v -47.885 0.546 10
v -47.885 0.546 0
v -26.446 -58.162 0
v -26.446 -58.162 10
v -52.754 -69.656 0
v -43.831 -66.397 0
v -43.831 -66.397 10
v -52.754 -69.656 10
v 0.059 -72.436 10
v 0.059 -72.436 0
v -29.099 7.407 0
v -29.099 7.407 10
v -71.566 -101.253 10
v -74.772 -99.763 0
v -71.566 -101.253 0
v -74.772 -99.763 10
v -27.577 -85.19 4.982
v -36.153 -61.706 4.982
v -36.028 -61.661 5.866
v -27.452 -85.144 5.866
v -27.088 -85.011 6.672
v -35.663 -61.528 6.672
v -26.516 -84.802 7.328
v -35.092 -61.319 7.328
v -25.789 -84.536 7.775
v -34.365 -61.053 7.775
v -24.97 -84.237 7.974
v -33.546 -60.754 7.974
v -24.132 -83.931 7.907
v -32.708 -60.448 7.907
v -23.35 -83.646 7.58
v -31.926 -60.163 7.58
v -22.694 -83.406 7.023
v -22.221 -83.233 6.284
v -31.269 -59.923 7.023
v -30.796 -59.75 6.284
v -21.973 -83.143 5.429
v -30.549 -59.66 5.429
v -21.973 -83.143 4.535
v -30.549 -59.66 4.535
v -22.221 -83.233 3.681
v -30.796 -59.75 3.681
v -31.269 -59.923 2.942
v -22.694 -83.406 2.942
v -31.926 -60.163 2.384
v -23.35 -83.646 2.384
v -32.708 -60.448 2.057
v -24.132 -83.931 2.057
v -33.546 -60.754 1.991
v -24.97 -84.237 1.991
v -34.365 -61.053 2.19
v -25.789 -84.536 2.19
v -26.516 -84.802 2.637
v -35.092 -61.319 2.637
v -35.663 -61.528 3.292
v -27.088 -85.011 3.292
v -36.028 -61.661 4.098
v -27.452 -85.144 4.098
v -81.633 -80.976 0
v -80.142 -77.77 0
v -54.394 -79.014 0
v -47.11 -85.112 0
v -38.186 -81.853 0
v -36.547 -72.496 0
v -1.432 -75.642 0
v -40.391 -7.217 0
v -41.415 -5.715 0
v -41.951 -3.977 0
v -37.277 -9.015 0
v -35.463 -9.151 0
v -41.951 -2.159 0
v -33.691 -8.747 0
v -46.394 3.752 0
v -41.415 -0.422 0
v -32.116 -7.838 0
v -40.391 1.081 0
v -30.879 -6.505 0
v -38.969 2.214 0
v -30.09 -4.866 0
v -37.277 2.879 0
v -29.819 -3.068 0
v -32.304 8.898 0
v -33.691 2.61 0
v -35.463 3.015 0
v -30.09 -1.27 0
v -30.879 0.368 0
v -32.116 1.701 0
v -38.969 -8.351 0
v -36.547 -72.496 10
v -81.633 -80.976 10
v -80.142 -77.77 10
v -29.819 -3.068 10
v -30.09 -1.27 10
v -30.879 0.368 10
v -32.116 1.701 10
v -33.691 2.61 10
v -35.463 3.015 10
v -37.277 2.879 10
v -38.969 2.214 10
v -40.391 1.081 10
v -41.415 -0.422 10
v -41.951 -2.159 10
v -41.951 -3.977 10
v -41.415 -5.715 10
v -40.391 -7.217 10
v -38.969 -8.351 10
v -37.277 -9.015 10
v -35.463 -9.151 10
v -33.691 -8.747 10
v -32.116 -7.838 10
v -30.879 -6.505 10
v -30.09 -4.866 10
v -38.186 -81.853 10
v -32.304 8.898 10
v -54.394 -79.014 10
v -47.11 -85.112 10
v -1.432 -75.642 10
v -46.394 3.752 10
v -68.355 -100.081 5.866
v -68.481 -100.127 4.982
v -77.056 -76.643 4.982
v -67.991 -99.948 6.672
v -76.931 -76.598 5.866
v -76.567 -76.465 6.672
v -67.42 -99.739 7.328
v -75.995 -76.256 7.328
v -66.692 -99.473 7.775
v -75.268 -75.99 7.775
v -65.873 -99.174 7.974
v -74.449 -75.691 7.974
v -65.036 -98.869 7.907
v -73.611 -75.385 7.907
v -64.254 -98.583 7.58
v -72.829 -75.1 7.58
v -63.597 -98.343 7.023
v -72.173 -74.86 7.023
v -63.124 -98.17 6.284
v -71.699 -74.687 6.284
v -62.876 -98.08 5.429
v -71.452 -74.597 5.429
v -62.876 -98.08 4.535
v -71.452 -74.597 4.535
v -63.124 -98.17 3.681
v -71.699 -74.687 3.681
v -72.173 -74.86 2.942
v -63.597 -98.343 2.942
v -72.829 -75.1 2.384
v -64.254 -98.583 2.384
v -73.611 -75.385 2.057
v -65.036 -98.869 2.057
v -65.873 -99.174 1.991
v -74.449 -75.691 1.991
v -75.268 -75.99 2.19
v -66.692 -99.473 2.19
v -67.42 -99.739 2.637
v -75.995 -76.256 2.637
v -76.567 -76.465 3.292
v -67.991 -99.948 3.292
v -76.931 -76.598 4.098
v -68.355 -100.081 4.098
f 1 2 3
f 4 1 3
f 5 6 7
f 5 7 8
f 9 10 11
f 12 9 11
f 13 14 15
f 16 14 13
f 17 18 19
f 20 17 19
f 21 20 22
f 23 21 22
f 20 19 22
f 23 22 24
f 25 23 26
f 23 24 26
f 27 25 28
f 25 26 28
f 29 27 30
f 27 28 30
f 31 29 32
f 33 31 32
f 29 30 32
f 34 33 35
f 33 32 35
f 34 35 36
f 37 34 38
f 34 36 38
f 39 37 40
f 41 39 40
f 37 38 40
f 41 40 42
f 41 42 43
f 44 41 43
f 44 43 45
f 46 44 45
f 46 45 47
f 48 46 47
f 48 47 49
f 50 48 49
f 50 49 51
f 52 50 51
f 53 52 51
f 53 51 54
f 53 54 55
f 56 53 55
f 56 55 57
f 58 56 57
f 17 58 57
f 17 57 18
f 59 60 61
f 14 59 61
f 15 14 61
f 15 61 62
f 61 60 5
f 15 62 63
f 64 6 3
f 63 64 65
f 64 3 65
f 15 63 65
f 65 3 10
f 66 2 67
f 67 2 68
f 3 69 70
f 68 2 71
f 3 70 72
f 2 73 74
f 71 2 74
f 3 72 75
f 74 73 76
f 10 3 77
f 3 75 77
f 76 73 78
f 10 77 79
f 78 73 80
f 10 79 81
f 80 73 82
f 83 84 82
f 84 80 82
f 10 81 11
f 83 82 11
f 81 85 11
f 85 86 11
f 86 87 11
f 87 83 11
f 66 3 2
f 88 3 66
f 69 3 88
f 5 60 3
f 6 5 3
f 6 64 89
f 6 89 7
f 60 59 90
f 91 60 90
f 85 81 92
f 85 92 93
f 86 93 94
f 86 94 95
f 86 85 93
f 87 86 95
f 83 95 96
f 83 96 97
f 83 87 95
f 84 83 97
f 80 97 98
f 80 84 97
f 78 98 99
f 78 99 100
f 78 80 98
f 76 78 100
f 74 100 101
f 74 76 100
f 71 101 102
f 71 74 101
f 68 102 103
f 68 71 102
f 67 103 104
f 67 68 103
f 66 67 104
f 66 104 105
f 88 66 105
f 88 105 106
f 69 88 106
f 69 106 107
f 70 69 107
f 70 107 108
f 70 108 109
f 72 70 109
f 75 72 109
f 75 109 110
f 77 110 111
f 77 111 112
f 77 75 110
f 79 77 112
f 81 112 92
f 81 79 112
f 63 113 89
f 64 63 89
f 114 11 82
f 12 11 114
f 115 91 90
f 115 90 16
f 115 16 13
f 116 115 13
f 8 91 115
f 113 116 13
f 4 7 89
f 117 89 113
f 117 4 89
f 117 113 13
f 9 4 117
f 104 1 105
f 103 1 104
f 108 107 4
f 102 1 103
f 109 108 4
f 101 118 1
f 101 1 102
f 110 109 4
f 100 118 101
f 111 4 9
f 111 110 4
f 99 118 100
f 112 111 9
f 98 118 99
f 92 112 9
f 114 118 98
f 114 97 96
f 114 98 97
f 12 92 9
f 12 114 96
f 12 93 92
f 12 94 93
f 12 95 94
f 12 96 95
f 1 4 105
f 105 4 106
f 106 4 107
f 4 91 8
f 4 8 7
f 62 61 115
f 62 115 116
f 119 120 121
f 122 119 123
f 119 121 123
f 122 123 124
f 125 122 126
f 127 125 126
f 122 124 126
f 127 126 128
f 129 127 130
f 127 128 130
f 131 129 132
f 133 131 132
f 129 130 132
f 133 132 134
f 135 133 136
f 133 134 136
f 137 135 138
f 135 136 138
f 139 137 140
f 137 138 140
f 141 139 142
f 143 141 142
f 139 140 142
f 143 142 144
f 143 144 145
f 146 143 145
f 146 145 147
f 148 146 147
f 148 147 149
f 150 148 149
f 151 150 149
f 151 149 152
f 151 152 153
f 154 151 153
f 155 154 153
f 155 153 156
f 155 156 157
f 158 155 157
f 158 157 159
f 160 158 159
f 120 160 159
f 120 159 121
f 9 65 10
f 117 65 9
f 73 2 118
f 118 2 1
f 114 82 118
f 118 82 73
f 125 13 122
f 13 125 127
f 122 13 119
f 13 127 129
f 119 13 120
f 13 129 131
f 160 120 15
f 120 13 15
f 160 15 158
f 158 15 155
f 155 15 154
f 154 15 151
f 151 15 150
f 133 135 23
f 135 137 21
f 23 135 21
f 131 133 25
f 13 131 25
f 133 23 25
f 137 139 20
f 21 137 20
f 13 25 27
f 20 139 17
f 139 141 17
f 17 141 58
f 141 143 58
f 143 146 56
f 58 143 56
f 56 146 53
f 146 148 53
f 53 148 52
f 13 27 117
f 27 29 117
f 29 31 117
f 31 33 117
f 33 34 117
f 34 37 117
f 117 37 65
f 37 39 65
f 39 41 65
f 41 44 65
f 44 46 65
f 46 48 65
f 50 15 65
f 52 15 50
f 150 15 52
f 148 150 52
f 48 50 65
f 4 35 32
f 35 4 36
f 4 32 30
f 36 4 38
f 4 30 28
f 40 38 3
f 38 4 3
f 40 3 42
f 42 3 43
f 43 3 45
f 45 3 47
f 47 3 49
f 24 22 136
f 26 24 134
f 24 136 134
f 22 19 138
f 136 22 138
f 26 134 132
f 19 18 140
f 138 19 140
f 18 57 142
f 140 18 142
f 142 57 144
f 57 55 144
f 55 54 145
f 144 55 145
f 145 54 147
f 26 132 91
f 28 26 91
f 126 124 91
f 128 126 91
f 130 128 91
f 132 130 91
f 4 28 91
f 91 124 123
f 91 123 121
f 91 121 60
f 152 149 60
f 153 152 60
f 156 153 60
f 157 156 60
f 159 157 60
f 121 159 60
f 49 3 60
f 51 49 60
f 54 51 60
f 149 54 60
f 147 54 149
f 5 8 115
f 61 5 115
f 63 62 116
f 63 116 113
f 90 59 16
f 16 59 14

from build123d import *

# Parameters (mm, degrees)
SKETCH_1_R          = 6.1
EXTRUDE_1_DEPTH     = 10
SKETCH_2_R          = 3
CUT_EXTRUDE_2_DEPTH = 116.089044031
CHAMFER_1_SIZE      = 2.5
CUT_EXTRUDE_3_DEPTH = 131.445982376


with BuildPart() as part:
    # 草圖1 → 填料-伸長1 (new body)
    with BuildSketch(Plane.XY):
        Polygon((-29.956118011, 9.755168573), (-48.742646001, 2.894675435), (-26.446043305, -58.161540532), (-82.490240349, -78.627846462), (-73.914623927, -102.111006449), (0.916101107, -74.784207382), align=None)
        with Locations((-35.919135437, -3.068341991)):
            Circle(SKETCH_1_R, mode=Mode.SUBTRACT)
    extrude(amount=EXTRUDE_1_DEPTH)

    # 草圖2 → 除料-伸長2 (cut, through all)
    with BuildSketch(Plane(origin=(15.628555148, -42.796674065, 0), x_dir=(0.9393263994919209, 0.3430246568652819, 0), z_dir=(-0.3430246568652819, 0.939326399491921, 0))):
        with Locations(Location((-95.671540667, -4.982155923, 0), (0, 0, 180))):
            Circle(SKETCH_2_R)
        with Locations(Location((-52.126292594, -4.982155923, 0), (0, 0, 180))):
            Circle(SKETCH_2_R)
    extrude(amount=-CUT_EXTRUDE_2_DEPTH, mode=Mode.SUBTRACT)

    # 導角1
    chamfer_1_edges = [part.edges().sort_by_distance(p)[0] for p in [
        (0.916101107, -74.784207382, 5),
        (-73.914623927, -102.111006449, 5),
        (-82.490240349, -78.627846462, 5),
        (-48.742646001, 2.894675435, 5),
        (-29.956118011, 9.755168573, 5),
    ]]
    chamfer(chamfer_1_edges, length=CHAMFER_1_SIZE)

    # 草圖3 → 除料-伸長3 (cut, through all)
    with BuildSketch(Plane(origin=(0, 0, 0), x_dir=(-1, 0, 0), z_dir=(0, 0, -1))):
        Polygon((52.754237092, -69.656073014), (54.393890854, -79.013505116), (47.10994382, -85.112202978), (38.186343025, -81.853468738), (36.546689263, -72.496036636), (43.830636297, -66.397338774), align=None)
    extrude(amount=-CUT_EXTRUDE_3_DEPTH, mode=Mode.SUBTRACT)


solid = part.part
